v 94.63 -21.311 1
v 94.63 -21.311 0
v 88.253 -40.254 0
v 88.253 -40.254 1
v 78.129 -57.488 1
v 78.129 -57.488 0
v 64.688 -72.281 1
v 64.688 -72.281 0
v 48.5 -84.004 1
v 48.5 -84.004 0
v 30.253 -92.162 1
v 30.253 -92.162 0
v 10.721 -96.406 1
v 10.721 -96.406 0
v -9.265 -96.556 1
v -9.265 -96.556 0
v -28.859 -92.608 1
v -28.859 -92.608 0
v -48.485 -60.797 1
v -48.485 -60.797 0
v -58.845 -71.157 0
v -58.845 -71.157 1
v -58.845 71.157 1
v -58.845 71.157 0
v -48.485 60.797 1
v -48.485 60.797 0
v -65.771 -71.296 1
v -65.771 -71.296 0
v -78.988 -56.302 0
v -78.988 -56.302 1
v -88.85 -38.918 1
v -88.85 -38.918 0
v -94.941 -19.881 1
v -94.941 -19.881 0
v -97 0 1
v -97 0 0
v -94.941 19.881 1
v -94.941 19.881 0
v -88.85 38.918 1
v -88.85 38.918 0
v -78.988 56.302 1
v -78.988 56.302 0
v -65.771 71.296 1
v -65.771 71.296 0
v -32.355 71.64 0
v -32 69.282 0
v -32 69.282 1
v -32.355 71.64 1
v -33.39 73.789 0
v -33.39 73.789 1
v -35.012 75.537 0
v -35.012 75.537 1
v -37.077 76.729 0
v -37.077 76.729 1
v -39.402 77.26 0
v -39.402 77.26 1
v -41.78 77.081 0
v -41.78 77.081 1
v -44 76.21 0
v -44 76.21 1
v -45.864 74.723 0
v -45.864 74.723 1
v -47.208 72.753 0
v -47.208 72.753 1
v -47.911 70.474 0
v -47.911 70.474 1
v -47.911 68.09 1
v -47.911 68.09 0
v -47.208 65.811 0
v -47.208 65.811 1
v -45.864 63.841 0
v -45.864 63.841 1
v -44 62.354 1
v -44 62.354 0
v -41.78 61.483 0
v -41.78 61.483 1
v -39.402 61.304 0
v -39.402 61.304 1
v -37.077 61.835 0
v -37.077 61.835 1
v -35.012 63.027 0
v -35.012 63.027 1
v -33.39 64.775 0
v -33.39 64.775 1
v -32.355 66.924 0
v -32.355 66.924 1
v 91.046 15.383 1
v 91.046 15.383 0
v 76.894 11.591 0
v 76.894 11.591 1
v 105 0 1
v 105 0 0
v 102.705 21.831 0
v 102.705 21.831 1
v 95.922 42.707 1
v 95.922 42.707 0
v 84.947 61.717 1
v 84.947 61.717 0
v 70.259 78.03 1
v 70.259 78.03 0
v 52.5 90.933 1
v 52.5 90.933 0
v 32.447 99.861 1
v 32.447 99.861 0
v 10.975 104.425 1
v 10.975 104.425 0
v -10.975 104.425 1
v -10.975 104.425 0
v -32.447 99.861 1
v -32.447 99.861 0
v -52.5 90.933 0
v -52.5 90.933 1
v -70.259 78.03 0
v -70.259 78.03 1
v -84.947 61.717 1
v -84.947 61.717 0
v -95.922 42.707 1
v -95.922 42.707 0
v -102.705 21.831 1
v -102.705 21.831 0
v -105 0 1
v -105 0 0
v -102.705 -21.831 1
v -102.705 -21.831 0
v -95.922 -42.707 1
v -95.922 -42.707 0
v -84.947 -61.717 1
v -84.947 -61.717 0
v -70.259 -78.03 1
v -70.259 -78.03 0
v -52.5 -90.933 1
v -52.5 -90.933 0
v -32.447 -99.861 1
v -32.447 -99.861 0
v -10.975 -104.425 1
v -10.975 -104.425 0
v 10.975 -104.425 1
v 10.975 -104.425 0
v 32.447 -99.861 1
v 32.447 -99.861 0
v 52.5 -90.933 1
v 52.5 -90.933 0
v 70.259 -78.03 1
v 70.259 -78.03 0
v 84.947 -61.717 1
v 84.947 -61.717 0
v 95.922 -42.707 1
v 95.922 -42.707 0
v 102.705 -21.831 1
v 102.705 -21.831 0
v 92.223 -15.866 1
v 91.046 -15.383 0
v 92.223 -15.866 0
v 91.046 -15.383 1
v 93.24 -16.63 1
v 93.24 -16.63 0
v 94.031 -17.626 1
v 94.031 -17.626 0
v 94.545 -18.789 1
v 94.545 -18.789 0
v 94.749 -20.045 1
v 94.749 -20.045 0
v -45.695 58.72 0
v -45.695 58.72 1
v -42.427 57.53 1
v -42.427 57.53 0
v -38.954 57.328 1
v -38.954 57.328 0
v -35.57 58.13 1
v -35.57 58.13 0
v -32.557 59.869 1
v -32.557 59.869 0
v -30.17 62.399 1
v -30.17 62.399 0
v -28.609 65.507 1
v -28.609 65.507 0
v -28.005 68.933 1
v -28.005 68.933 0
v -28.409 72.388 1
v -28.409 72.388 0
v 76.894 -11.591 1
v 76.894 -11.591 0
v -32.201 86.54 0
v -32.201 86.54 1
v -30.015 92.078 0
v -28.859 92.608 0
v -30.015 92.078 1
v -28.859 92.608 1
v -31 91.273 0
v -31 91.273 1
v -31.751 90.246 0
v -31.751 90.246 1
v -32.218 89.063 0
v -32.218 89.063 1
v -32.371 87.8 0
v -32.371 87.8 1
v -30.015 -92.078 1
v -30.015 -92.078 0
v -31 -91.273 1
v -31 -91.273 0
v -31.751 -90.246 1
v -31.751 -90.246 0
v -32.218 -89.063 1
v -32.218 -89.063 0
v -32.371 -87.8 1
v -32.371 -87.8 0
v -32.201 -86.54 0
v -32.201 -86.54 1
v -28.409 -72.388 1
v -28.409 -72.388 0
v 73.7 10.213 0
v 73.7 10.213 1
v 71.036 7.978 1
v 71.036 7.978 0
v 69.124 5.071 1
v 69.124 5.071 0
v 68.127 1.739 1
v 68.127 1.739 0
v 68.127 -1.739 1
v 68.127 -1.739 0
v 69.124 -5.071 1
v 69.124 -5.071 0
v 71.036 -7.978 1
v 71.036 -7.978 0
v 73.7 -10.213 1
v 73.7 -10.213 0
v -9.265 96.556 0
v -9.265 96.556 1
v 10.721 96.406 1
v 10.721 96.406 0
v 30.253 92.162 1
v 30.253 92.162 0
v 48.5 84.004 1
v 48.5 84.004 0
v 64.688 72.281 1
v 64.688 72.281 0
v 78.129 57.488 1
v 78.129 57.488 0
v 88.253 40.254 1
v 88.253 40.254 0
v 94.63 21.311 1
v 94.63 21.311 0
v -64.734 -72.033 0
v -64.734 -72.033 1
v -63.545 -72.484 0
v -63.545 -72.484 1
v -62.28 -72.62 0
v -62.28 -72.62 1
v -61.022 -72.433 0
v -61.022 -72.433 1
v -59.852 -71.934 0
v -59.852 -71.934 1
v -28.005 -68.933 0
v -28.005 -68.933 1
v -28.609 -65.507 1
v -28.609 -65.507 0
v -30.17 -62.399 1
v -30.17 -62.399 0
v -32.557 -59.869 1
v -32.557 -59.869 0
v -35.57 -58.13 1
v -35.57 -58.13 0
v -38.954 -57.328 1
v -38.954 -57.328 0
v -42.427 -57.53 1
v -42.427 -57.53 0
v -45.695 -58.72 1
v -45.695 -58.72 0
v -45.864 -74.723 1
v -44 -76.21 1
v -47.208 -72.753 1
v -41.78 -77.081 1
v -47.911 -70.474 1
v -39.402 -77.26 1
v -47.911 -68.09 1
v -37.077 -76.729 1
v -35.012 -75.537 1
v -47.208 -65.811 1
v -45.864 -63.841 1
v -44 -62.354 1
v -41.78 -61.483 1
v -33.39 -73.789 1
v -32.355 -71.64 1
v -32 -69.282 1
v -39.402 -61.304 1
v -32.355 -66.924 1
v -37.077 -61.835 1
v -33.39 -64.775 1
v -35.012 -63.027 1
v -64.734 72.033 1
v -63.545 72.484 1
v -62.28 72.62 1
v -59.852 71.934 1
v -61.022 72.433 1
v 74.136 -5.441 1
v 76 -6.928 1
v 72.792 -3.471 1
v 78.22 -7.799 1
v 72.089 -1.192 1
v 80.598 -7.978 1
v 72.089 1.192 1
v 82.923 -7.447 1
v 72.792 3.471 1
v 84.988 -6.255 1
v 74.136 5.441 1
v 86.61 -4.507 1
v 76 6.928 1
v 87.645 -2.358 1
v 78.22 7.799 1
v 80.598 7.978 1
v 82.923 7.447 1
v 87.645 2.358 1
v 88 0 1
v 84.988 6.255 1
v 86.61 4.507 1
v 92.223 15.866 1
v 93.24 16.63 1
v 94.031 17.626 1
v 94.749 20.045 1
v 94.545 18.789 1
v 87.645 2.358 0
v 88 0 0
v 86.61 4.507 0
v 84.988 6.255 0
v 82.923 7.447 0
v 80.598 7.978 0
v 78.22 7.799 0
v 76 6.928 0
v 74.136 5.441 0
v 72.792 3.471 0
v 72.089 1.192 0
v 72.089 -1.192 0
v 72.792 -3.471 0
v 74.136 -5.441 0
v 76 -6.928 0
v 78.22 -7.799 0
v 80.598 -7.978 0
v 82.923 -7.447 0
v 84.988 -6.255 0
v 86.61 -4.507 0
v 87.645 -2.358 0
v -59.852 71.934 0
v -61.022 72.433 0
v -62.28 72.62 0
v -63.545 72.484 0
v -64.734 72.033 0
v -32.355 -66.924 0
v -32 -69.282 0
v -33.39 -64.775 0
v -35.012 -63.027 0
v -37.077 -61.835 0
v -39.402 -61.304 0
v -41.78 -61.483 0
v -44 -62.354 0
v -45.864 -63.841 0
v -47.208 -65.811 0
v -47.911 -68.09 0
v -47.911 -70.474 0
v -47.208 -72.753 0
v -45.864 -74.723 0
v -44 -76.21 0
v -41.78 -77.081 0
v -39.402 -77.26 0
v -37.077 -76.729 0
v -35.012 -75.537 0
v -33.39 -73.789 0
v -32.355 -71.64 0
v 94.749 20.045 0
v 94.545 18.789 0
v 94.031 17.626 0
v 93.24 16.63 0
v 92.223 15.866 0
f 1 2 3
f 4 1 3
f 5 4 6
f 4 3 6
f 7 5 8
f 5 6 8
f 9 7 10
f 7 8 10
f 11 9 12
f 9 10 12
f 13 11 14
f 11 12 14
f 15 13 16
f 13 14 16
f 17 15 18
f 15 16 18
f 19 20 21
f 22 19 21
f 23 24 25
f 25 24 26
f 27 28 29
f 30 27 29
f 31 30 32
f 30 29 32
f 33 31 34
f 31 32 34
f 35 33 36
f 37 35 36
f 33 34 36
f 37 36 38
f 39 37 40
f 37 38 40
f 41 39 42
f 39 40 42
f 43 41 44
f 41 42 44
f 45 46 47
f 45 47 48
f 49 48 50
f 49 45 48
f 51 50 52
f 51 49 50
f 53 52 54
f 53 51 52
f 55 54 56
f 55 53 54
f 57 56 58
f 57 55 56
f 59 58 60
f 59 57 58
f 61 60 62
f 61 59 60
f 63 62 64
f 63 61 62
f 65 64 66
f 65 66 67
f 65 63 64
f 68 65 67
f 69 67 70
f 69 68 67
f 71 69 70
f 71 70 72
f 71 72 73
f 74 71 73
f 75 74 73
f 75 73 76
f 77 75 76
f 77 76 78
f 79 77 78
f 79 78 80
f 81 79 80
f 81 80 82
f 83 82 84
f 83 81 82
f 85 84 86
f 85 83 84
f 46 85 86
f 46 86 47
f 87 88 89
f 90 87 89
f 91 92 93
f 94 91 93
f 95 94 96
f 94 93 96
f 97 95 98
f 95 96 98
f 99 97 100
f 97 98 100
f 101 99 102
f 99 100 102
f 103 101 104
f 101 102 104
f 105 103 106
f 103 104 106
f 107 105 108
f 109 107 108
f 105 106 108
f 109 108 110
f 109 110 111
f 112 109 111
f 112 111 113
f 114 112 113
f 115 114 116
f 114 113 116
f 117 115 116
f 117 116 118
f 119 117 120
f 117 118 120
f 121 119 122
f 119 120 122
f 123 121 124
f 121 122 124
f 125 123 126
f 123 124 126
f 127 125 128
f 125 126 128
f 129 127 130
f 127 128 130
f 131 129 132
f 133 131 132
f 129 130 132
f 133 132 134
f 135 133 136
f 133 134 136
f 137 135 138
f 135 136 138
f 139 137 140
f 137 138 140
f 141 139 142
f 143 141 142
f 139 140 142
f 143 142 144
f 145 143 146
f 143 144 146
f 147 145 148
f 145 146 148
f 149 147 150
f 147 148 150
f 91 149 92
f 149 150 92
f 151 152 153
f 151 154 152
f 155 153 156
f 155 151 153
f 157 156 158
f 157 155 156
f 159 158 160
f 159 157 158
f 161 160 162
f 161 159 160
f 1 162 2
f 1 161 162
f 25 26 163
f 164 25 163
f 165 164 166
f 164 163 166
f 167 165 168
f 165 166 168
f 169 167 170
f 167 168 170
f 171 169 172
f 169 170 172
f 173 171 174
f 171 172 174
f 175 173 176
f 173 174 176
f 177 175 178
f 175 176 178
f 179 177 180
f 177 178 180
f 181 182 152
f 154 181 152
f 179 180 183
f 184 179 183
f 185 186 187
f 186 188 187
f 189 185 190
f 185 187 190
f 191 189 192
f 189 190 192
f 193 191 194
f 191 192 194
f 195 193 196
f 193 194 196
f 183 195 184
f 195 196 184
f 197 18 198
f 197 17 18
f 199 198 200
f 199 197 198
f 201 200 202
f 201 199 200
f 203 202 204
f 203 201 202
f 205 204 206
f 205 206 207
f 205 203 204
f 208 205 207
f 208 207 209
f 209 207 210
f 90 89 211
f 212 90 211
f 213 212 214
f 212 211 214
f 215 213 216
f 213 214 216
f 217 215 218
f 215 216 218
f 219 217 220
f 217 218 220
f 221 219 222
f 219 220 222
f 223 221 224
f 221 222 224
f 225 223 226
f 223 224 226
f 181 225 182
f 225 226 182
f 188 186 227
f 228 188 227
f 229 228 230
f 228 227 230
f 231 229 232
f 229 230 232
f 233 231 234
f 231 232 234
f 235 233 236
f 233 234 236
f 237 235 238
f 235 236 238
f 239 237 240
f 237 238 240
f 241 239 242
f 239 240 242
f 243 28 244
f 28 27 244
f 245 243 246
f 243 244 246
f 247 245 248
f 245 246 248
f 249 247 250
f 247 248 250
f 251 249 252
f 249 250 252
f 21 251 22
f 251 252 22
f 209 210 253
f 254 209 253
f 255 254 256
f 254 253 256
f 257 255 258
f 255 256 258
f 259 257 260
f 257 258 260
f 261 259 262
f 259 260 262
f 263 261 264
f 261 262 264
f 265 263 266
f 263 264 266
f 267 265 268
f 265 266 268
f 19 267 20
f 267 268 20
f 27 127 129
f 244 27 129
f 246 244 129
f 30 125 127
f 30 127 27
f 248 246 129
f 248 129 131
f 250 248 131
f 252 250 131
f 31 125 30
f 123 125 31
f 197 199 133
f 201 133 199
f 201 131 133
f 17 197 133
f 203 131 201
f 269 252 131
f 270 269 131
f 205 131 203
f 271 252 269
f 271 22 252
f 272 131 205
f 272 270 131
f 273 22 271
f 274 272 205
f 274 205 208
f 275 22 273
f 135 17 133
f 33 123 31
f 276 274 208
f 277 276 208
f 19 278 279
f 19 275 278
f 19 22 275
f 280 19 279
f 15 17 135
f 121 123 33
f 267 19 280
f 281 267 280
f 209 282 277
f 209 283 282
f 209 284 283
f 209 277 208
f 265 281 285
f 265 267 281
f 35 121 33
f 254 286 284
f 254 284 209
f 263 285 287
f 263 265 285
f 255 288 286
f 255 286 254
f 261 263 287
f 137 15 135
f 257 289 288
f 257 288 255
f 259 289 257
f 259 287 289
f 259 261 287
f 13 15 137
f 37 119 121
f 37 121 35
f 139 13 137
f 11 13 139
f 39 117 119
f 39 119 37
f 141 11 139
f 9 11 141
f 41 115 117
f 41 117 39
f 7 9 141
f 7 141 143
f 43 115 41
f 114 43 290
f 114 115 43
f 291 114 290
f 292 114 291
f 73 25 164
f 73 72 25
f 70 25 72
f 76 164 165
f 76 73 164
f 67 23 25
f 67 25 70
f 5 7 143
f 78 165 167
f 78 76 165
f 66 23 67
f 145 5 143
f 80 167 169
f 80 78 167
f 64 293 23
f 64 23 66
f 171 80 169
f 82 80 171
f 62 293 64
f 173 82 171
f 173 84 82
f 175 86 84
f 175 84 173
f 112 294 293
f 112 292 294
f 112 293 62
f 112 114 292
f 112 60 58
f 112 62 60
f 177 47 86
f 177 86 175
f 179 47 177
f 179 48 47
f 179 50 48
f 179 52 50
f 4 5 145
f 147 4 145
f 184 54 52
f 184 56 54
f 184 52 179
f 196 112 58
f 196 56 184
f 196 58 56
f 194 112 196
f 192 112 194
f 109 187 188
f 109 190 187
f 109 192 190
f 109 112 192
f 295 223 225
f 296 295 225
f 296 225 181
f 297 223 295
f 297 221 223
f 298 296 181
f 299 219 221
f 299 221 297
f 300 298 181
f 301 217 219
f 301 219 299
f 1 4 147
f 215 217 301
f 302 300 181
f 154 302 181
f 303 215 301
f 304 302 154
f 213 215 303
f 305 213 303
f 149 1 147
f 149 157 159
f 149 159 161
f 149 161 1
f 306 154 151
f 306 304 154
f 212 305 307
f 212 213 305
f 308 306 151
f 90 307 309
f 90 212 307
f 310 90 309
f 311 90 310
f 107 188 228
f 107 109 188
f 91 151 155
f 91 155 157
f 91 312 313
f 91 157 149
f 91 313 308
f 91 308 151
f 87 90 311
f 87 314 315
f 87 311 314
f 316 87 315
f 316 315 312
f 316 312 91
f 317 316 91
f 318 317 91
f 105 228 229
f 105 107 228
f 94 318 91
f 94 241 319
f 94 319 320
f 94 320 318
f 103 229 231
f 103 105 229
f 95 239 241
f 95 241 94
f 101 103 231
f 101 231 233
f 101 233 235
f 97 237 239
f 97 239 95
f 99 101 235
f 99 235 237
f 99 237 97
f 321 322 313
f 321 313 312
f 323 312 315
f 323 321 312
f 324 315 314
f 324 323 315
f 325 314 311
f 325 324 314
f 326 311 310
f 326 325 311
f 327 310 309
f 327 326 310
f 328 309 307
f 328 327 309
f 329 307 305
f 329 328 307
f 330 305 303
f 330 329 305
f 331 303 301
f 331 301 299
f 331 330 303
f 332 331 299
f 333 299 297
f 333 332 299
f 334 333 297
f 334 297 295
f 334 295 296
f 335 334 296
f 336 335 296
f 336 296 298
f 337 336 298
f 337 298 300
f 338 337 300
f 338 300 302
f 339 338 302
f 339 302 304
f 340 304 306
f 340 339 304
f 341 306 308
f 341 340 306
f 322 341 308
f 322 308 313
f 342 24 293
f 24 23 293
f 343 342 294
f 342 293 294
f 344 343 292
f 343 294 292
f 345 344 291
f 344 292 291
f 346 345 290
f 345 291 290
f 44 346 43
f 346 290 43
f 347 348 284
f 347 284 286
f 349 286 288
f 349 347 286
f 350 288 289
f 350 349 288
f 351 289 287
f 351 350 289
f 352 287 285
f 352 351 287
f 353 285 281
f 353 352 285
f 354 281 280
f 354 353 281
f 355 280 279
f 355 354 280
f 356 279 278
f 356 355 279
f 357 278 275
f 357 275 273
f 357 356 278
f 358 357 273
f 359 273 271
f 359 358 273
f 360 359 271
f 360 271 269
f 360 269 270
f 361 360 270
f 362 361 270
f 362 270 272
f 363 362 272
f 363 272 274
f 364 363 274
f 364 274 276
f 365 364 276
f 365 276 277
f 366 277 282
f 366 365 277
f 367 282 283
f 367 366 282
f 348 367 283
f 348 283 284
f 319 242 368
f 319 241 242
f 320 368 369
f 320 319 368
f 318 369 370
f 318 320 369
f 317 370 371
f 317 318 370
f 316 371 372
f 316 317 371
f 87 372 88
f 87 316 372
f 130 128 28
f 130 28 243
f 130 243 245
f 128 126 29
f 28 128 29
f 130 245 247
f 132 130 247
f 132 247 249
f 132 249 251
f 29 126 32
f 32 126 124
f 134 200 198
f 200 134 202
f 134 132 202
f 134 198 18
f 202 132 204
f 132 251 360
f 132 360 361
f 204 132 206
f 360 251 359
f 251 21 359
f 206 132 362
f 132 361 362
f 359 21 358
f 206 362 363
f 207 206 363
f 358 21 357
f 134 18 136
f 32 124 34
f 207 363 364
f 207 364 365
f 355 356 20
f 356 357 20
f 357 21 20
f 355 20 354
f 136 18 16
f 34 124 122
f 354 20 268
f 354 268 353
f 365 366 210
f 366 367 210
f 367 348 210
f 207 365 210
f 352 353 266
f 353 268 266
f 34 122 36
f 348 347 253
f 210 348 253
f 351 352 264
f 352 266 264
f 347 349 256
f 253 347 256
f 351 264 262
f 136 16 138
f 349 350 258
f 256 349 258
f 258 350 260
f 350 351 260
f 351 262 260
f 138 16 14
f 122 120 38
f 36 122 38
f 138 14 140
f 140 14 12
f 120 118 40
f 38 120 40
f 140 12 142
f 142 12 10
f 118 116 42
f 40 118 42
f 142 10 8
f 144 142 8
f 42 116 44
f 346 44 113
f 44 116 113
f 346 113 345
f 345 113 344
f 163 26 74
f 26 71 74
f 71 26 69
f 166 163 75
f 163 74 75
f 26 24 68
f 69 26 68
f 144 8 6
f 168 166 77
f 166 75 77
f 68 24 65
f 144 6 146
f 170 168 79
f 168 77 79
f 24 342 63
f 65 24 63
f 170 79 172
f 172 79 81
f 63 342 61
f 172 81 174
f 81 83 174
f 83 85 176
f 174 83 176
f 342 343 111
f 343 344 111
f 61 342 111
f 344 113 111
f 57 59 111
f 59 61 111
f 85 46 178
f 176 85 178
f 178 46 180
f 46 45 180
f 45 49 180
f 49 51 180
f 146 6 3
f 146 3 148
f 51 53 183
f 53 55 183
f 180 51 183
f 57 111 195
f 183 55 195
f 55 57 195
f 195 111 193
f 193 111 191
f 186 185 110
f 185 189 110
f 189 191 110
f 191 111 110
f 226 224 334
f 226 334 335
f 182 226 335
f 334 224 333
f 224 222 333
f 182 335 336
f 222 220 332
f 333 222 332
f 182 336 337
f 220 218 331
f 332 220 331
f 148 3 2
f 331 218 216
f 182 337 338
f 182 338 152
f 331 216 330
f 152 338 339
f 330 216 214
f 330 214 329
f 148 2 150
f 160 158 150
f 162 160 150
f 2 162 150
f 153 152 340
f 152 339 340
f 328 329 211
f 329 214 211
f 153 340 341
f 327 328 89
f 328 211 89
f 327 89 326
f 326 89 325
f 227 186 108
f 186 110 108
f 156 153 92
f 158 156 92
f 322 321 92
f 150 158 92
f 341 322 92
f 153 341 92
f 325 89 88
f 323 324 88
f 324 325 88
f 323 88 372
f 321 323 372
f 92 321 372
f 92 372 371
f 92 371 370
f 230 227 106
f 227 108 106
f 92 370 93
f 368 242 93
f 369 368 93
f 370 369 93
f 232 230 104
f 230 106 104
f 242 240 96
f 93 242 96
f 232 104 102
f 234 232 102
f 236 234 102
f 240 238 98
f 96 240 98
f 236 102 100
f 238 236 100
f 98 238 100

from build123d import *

# Parameters (mm, degrees)
ESQUISSE1_R        = 105
ESQUISSE1_R_2      = 8
BOSS_EXTRU_1_DEPTH = 1
CONG_1_R           = 5


with BuildPart() as part:
    # Esquisse1 → Boss.-Extru.1 (new body)
    with BuildSketch(Plane.XY):
        Circle(ESQUISSE1_R)
        with BuildLine():
            Line((95.569858419, 16.595245155), (76.894171459, 11.591109915))
            ThreePointArc((76.894171459, 11.591109915), (68, 0), (76.894171459, -11.591109915))
            Line((76.894171459, -11.591109915), (95.569858419, -16.595245155))
            ThreePointArc((95.569858419, -16.595245155), (48.5, -84.004464167), (-33.413025324, -91.063547804))
            Line((-33.413025324, -91.063547804), (-28.408890085, -72.387860844))
            ThreePointArc((-28.408890085, -72.387860844), (-34, -58.889727457), (-48.485281374, -60.796750929))
            Line((-48.485281374, -60.796750929), (-62.156833095, -74.46830265))
            ThreePointArc((-62.156833095, -74.46830265), (-97, 0), (-62.156833096, 74.46830265))
            Line((-62.156833096, 74.46830265), (-48.485281374, 60.796750929))
            ThreePointArc((-48.485281374, 60.796750929), (-34, 58.889727457), (-28.408890085, 72.387860844))
            Line((-28.408890085, 72.387860844), (-33.413025324, 91.063547804))
            ThreePointArc((-33.413025324, 91.063547804), (48.5, 84.004464167), (95.569858419, 16.595245155))
        make_face(mode=Mode.SUBTRACT)
        with Locations((80, 0)):
            Circle(ESQUISSE1_R_2, mode=Mode.SUBTRACT)
        with Locations((-40, 69.282032303)):
            Circle(ESQUISSE1_R_2, mode=Mode.SUBTRACT)
        with Locations((-40, -69.282032303)):
            Circle(ESQUISSE1_R_2, mode=Mode.SUBTRACT)
    extrude(amount=BOSS_EXTRU_1_DEPTH)

    # Congé1
    cong_1_edges = [part.edges().sort_by_distance(p)[0] for p in [
        (-62.156833096, 74.46830265, 0.5),
        (-62.156833095, -74.46830265, 0.5),
        (-33.413025324, -91.063547804, 0.5),
        (95.569858419, -16.595245155, 0.5),
        (95.569858419, 16.595245155, 0.5),
        (-33.413025324, 91.063547804, 0.5),
    ]]
    fillet(cong_1_edges, radius=CONG_1_R)


solid = part.part
